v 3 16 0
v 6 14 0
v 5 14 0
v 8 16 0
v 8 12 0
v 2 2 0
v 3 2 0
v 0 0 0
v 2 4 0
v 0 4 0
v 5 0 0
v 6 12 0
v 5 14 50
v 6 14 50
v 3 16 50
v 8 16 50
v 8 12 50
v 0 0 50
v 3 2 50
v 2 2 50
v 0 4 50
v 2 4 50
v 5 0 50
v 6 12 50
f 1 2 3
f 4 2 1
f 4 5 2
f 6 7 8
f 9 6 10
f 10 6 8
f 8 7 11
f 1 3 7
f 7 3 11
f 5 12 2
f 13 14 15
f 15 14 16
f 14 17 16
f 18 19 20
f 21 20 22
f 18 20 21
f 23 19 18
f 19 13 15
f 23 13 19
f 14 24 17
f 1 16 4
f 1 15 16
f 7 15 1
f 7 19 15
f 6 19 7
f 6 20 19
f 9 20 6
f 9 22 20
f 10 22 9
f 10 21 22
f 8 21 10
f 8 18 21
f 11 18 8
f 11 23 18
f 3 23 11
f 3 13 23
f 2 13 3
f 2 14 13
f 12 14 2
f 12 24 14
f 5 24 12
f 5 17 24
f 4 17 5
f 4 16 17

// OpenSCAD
$fa = 1;
$fs = 1.75 / 2;

thickness = 2;
channel_width = 1;
inner_length = 12;

linear_extrude(height = 50)
difference() {
    square([thickness * 3 + channel_width * 2, inner_length + thickness * 2]);

    translate([0, thickness * 2])
    square([thickness + channel_width, inner_length]);

    translate([thickness * 2 + channel_width, 0])
    square([thickness + channel_width, inner_length]);

    translate([thickness, thickness])
    square([channel_width, thickness]);

    translate([thickness * 2 + channel_width, inner_length])
    square([channel_width, thickness]);
}
